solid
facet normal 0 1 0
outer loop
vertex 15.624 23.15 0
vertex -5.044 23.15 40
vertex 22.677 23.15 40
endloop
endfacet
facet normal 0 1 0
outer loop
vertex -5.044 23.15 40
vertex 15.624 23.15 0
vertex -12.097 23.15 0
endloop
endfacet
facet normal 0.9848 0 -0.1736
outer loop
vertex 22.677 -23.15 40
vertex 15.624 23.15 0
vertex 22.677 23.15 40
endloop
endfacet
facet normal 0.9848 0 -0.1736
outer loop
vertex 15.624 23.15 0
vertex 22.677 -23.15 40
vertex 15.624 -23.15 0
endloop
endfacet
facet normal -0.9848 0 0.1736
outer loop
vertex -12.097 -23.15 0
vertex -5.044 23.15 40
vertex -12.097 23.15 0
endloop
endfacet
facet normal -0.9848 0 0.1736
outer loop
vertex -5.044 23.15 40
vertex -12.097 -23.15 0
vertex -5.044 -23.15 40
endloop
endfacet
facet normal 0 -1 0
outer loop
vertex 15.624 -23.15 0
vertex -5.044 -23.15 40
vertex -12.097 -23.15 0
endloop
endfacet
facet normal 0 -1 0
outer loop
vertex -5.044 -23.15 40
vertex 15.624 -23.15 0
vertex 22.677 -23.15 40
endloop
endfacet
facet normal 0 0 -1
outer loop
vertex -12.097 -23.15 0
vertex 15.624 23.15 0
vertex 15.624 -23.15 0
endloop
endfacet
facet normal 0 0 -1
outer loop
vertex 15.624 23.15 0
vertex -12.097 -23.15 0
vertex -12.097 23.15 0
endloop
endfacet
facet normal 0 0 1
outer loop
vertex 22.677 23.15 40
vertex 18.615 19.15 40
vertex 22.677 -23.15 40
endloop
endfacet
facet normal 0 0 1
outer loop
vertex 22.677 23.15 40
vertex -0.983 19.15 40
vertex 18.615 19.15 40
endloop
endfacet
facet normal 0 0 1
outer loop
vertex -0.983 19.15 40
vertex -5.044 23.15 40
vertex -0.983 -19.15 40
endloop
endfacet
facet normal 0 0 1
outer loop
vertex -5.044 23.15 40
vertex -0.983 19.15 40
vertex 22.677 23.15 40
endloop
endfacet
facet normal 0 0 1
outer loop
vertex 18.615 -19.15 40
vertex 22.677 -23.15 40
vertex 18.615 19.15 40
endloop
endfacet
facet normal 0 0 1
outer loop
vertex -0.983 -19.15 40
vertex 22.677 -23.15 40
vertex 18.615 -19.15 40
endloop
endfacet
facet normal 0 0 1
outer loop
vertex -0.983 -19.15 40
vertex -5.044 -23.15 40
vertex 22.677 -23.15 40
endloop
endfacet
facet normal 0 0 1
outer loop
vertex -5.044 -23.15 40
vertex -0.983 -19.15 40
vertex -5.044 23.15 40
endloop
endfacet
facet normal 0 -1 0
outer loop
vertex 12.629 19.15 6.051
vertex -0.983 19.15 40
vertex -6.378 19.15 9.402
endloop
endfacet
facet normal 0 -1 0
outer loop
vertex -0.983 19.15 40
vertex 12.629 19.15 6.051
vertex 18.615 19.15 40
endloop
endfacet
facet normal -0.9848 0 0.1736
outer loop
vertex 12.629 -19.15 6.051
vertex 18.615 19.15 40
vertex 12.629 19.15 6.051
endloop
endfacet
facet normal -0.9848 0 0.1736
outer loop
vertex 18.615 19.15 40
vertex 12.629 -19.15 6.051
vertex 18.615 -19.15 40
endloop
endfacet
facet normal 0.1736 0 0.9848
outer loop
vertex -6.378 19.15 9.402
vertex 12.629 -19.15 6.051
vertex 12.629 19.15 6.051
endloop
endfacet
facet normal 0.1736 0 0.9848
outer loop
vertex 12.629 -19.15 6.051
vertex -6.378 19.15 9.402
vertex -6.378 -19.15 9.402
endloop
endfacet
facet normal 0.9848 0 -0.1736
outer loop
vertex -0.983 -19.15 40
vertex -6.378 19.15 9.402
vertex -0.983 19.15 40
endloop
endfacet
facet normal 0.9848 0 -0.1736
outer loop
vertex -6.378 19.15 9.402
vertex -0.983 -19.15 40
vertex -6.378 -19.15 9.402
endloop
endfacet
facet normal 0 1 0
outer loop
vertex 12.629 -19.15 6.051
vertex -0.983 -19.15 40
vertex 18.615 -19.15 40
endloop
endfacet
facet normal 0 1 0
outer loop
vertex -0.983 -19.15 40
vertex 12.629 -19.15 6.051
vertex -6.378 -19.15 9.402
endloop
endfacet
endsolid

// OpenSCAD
union() {
	difference() {
		difference() {
			difference() {
				translate(v = [0, 0, -10]) {
					rotate(a = 10, v = [0, 1, 0]) {
						translate(v = [-13.6500000000, -23.1500000000, 0]) {
							cube(size = [27.3000000000, 46.3000000000, 60]);
						}
					}
				}
				translate(v = [0, 0, -20]) {
					translate(v = [-50.0000000000, -50.0000000000, 0]) {
						cube(size = [100, 100, 20]);
					}
				}
			}
			translate(v = [0, 0, 40]) {
				translate(v = [-50.0000000000, -50.0000000000, 0]) {
					cube(size = [100, 100, 20]);
				}
			}
		}
		translate(v = [0, 0, -10]) {
			rotate(a = 10, v = [0, 1, 0]) {
				translate(v = [-9.6500000000, -19.1500000000, 18]) {
					cube(size = [19.3000000000, 38.3000000000, 60]);
				}
			}
		}
	}
}
